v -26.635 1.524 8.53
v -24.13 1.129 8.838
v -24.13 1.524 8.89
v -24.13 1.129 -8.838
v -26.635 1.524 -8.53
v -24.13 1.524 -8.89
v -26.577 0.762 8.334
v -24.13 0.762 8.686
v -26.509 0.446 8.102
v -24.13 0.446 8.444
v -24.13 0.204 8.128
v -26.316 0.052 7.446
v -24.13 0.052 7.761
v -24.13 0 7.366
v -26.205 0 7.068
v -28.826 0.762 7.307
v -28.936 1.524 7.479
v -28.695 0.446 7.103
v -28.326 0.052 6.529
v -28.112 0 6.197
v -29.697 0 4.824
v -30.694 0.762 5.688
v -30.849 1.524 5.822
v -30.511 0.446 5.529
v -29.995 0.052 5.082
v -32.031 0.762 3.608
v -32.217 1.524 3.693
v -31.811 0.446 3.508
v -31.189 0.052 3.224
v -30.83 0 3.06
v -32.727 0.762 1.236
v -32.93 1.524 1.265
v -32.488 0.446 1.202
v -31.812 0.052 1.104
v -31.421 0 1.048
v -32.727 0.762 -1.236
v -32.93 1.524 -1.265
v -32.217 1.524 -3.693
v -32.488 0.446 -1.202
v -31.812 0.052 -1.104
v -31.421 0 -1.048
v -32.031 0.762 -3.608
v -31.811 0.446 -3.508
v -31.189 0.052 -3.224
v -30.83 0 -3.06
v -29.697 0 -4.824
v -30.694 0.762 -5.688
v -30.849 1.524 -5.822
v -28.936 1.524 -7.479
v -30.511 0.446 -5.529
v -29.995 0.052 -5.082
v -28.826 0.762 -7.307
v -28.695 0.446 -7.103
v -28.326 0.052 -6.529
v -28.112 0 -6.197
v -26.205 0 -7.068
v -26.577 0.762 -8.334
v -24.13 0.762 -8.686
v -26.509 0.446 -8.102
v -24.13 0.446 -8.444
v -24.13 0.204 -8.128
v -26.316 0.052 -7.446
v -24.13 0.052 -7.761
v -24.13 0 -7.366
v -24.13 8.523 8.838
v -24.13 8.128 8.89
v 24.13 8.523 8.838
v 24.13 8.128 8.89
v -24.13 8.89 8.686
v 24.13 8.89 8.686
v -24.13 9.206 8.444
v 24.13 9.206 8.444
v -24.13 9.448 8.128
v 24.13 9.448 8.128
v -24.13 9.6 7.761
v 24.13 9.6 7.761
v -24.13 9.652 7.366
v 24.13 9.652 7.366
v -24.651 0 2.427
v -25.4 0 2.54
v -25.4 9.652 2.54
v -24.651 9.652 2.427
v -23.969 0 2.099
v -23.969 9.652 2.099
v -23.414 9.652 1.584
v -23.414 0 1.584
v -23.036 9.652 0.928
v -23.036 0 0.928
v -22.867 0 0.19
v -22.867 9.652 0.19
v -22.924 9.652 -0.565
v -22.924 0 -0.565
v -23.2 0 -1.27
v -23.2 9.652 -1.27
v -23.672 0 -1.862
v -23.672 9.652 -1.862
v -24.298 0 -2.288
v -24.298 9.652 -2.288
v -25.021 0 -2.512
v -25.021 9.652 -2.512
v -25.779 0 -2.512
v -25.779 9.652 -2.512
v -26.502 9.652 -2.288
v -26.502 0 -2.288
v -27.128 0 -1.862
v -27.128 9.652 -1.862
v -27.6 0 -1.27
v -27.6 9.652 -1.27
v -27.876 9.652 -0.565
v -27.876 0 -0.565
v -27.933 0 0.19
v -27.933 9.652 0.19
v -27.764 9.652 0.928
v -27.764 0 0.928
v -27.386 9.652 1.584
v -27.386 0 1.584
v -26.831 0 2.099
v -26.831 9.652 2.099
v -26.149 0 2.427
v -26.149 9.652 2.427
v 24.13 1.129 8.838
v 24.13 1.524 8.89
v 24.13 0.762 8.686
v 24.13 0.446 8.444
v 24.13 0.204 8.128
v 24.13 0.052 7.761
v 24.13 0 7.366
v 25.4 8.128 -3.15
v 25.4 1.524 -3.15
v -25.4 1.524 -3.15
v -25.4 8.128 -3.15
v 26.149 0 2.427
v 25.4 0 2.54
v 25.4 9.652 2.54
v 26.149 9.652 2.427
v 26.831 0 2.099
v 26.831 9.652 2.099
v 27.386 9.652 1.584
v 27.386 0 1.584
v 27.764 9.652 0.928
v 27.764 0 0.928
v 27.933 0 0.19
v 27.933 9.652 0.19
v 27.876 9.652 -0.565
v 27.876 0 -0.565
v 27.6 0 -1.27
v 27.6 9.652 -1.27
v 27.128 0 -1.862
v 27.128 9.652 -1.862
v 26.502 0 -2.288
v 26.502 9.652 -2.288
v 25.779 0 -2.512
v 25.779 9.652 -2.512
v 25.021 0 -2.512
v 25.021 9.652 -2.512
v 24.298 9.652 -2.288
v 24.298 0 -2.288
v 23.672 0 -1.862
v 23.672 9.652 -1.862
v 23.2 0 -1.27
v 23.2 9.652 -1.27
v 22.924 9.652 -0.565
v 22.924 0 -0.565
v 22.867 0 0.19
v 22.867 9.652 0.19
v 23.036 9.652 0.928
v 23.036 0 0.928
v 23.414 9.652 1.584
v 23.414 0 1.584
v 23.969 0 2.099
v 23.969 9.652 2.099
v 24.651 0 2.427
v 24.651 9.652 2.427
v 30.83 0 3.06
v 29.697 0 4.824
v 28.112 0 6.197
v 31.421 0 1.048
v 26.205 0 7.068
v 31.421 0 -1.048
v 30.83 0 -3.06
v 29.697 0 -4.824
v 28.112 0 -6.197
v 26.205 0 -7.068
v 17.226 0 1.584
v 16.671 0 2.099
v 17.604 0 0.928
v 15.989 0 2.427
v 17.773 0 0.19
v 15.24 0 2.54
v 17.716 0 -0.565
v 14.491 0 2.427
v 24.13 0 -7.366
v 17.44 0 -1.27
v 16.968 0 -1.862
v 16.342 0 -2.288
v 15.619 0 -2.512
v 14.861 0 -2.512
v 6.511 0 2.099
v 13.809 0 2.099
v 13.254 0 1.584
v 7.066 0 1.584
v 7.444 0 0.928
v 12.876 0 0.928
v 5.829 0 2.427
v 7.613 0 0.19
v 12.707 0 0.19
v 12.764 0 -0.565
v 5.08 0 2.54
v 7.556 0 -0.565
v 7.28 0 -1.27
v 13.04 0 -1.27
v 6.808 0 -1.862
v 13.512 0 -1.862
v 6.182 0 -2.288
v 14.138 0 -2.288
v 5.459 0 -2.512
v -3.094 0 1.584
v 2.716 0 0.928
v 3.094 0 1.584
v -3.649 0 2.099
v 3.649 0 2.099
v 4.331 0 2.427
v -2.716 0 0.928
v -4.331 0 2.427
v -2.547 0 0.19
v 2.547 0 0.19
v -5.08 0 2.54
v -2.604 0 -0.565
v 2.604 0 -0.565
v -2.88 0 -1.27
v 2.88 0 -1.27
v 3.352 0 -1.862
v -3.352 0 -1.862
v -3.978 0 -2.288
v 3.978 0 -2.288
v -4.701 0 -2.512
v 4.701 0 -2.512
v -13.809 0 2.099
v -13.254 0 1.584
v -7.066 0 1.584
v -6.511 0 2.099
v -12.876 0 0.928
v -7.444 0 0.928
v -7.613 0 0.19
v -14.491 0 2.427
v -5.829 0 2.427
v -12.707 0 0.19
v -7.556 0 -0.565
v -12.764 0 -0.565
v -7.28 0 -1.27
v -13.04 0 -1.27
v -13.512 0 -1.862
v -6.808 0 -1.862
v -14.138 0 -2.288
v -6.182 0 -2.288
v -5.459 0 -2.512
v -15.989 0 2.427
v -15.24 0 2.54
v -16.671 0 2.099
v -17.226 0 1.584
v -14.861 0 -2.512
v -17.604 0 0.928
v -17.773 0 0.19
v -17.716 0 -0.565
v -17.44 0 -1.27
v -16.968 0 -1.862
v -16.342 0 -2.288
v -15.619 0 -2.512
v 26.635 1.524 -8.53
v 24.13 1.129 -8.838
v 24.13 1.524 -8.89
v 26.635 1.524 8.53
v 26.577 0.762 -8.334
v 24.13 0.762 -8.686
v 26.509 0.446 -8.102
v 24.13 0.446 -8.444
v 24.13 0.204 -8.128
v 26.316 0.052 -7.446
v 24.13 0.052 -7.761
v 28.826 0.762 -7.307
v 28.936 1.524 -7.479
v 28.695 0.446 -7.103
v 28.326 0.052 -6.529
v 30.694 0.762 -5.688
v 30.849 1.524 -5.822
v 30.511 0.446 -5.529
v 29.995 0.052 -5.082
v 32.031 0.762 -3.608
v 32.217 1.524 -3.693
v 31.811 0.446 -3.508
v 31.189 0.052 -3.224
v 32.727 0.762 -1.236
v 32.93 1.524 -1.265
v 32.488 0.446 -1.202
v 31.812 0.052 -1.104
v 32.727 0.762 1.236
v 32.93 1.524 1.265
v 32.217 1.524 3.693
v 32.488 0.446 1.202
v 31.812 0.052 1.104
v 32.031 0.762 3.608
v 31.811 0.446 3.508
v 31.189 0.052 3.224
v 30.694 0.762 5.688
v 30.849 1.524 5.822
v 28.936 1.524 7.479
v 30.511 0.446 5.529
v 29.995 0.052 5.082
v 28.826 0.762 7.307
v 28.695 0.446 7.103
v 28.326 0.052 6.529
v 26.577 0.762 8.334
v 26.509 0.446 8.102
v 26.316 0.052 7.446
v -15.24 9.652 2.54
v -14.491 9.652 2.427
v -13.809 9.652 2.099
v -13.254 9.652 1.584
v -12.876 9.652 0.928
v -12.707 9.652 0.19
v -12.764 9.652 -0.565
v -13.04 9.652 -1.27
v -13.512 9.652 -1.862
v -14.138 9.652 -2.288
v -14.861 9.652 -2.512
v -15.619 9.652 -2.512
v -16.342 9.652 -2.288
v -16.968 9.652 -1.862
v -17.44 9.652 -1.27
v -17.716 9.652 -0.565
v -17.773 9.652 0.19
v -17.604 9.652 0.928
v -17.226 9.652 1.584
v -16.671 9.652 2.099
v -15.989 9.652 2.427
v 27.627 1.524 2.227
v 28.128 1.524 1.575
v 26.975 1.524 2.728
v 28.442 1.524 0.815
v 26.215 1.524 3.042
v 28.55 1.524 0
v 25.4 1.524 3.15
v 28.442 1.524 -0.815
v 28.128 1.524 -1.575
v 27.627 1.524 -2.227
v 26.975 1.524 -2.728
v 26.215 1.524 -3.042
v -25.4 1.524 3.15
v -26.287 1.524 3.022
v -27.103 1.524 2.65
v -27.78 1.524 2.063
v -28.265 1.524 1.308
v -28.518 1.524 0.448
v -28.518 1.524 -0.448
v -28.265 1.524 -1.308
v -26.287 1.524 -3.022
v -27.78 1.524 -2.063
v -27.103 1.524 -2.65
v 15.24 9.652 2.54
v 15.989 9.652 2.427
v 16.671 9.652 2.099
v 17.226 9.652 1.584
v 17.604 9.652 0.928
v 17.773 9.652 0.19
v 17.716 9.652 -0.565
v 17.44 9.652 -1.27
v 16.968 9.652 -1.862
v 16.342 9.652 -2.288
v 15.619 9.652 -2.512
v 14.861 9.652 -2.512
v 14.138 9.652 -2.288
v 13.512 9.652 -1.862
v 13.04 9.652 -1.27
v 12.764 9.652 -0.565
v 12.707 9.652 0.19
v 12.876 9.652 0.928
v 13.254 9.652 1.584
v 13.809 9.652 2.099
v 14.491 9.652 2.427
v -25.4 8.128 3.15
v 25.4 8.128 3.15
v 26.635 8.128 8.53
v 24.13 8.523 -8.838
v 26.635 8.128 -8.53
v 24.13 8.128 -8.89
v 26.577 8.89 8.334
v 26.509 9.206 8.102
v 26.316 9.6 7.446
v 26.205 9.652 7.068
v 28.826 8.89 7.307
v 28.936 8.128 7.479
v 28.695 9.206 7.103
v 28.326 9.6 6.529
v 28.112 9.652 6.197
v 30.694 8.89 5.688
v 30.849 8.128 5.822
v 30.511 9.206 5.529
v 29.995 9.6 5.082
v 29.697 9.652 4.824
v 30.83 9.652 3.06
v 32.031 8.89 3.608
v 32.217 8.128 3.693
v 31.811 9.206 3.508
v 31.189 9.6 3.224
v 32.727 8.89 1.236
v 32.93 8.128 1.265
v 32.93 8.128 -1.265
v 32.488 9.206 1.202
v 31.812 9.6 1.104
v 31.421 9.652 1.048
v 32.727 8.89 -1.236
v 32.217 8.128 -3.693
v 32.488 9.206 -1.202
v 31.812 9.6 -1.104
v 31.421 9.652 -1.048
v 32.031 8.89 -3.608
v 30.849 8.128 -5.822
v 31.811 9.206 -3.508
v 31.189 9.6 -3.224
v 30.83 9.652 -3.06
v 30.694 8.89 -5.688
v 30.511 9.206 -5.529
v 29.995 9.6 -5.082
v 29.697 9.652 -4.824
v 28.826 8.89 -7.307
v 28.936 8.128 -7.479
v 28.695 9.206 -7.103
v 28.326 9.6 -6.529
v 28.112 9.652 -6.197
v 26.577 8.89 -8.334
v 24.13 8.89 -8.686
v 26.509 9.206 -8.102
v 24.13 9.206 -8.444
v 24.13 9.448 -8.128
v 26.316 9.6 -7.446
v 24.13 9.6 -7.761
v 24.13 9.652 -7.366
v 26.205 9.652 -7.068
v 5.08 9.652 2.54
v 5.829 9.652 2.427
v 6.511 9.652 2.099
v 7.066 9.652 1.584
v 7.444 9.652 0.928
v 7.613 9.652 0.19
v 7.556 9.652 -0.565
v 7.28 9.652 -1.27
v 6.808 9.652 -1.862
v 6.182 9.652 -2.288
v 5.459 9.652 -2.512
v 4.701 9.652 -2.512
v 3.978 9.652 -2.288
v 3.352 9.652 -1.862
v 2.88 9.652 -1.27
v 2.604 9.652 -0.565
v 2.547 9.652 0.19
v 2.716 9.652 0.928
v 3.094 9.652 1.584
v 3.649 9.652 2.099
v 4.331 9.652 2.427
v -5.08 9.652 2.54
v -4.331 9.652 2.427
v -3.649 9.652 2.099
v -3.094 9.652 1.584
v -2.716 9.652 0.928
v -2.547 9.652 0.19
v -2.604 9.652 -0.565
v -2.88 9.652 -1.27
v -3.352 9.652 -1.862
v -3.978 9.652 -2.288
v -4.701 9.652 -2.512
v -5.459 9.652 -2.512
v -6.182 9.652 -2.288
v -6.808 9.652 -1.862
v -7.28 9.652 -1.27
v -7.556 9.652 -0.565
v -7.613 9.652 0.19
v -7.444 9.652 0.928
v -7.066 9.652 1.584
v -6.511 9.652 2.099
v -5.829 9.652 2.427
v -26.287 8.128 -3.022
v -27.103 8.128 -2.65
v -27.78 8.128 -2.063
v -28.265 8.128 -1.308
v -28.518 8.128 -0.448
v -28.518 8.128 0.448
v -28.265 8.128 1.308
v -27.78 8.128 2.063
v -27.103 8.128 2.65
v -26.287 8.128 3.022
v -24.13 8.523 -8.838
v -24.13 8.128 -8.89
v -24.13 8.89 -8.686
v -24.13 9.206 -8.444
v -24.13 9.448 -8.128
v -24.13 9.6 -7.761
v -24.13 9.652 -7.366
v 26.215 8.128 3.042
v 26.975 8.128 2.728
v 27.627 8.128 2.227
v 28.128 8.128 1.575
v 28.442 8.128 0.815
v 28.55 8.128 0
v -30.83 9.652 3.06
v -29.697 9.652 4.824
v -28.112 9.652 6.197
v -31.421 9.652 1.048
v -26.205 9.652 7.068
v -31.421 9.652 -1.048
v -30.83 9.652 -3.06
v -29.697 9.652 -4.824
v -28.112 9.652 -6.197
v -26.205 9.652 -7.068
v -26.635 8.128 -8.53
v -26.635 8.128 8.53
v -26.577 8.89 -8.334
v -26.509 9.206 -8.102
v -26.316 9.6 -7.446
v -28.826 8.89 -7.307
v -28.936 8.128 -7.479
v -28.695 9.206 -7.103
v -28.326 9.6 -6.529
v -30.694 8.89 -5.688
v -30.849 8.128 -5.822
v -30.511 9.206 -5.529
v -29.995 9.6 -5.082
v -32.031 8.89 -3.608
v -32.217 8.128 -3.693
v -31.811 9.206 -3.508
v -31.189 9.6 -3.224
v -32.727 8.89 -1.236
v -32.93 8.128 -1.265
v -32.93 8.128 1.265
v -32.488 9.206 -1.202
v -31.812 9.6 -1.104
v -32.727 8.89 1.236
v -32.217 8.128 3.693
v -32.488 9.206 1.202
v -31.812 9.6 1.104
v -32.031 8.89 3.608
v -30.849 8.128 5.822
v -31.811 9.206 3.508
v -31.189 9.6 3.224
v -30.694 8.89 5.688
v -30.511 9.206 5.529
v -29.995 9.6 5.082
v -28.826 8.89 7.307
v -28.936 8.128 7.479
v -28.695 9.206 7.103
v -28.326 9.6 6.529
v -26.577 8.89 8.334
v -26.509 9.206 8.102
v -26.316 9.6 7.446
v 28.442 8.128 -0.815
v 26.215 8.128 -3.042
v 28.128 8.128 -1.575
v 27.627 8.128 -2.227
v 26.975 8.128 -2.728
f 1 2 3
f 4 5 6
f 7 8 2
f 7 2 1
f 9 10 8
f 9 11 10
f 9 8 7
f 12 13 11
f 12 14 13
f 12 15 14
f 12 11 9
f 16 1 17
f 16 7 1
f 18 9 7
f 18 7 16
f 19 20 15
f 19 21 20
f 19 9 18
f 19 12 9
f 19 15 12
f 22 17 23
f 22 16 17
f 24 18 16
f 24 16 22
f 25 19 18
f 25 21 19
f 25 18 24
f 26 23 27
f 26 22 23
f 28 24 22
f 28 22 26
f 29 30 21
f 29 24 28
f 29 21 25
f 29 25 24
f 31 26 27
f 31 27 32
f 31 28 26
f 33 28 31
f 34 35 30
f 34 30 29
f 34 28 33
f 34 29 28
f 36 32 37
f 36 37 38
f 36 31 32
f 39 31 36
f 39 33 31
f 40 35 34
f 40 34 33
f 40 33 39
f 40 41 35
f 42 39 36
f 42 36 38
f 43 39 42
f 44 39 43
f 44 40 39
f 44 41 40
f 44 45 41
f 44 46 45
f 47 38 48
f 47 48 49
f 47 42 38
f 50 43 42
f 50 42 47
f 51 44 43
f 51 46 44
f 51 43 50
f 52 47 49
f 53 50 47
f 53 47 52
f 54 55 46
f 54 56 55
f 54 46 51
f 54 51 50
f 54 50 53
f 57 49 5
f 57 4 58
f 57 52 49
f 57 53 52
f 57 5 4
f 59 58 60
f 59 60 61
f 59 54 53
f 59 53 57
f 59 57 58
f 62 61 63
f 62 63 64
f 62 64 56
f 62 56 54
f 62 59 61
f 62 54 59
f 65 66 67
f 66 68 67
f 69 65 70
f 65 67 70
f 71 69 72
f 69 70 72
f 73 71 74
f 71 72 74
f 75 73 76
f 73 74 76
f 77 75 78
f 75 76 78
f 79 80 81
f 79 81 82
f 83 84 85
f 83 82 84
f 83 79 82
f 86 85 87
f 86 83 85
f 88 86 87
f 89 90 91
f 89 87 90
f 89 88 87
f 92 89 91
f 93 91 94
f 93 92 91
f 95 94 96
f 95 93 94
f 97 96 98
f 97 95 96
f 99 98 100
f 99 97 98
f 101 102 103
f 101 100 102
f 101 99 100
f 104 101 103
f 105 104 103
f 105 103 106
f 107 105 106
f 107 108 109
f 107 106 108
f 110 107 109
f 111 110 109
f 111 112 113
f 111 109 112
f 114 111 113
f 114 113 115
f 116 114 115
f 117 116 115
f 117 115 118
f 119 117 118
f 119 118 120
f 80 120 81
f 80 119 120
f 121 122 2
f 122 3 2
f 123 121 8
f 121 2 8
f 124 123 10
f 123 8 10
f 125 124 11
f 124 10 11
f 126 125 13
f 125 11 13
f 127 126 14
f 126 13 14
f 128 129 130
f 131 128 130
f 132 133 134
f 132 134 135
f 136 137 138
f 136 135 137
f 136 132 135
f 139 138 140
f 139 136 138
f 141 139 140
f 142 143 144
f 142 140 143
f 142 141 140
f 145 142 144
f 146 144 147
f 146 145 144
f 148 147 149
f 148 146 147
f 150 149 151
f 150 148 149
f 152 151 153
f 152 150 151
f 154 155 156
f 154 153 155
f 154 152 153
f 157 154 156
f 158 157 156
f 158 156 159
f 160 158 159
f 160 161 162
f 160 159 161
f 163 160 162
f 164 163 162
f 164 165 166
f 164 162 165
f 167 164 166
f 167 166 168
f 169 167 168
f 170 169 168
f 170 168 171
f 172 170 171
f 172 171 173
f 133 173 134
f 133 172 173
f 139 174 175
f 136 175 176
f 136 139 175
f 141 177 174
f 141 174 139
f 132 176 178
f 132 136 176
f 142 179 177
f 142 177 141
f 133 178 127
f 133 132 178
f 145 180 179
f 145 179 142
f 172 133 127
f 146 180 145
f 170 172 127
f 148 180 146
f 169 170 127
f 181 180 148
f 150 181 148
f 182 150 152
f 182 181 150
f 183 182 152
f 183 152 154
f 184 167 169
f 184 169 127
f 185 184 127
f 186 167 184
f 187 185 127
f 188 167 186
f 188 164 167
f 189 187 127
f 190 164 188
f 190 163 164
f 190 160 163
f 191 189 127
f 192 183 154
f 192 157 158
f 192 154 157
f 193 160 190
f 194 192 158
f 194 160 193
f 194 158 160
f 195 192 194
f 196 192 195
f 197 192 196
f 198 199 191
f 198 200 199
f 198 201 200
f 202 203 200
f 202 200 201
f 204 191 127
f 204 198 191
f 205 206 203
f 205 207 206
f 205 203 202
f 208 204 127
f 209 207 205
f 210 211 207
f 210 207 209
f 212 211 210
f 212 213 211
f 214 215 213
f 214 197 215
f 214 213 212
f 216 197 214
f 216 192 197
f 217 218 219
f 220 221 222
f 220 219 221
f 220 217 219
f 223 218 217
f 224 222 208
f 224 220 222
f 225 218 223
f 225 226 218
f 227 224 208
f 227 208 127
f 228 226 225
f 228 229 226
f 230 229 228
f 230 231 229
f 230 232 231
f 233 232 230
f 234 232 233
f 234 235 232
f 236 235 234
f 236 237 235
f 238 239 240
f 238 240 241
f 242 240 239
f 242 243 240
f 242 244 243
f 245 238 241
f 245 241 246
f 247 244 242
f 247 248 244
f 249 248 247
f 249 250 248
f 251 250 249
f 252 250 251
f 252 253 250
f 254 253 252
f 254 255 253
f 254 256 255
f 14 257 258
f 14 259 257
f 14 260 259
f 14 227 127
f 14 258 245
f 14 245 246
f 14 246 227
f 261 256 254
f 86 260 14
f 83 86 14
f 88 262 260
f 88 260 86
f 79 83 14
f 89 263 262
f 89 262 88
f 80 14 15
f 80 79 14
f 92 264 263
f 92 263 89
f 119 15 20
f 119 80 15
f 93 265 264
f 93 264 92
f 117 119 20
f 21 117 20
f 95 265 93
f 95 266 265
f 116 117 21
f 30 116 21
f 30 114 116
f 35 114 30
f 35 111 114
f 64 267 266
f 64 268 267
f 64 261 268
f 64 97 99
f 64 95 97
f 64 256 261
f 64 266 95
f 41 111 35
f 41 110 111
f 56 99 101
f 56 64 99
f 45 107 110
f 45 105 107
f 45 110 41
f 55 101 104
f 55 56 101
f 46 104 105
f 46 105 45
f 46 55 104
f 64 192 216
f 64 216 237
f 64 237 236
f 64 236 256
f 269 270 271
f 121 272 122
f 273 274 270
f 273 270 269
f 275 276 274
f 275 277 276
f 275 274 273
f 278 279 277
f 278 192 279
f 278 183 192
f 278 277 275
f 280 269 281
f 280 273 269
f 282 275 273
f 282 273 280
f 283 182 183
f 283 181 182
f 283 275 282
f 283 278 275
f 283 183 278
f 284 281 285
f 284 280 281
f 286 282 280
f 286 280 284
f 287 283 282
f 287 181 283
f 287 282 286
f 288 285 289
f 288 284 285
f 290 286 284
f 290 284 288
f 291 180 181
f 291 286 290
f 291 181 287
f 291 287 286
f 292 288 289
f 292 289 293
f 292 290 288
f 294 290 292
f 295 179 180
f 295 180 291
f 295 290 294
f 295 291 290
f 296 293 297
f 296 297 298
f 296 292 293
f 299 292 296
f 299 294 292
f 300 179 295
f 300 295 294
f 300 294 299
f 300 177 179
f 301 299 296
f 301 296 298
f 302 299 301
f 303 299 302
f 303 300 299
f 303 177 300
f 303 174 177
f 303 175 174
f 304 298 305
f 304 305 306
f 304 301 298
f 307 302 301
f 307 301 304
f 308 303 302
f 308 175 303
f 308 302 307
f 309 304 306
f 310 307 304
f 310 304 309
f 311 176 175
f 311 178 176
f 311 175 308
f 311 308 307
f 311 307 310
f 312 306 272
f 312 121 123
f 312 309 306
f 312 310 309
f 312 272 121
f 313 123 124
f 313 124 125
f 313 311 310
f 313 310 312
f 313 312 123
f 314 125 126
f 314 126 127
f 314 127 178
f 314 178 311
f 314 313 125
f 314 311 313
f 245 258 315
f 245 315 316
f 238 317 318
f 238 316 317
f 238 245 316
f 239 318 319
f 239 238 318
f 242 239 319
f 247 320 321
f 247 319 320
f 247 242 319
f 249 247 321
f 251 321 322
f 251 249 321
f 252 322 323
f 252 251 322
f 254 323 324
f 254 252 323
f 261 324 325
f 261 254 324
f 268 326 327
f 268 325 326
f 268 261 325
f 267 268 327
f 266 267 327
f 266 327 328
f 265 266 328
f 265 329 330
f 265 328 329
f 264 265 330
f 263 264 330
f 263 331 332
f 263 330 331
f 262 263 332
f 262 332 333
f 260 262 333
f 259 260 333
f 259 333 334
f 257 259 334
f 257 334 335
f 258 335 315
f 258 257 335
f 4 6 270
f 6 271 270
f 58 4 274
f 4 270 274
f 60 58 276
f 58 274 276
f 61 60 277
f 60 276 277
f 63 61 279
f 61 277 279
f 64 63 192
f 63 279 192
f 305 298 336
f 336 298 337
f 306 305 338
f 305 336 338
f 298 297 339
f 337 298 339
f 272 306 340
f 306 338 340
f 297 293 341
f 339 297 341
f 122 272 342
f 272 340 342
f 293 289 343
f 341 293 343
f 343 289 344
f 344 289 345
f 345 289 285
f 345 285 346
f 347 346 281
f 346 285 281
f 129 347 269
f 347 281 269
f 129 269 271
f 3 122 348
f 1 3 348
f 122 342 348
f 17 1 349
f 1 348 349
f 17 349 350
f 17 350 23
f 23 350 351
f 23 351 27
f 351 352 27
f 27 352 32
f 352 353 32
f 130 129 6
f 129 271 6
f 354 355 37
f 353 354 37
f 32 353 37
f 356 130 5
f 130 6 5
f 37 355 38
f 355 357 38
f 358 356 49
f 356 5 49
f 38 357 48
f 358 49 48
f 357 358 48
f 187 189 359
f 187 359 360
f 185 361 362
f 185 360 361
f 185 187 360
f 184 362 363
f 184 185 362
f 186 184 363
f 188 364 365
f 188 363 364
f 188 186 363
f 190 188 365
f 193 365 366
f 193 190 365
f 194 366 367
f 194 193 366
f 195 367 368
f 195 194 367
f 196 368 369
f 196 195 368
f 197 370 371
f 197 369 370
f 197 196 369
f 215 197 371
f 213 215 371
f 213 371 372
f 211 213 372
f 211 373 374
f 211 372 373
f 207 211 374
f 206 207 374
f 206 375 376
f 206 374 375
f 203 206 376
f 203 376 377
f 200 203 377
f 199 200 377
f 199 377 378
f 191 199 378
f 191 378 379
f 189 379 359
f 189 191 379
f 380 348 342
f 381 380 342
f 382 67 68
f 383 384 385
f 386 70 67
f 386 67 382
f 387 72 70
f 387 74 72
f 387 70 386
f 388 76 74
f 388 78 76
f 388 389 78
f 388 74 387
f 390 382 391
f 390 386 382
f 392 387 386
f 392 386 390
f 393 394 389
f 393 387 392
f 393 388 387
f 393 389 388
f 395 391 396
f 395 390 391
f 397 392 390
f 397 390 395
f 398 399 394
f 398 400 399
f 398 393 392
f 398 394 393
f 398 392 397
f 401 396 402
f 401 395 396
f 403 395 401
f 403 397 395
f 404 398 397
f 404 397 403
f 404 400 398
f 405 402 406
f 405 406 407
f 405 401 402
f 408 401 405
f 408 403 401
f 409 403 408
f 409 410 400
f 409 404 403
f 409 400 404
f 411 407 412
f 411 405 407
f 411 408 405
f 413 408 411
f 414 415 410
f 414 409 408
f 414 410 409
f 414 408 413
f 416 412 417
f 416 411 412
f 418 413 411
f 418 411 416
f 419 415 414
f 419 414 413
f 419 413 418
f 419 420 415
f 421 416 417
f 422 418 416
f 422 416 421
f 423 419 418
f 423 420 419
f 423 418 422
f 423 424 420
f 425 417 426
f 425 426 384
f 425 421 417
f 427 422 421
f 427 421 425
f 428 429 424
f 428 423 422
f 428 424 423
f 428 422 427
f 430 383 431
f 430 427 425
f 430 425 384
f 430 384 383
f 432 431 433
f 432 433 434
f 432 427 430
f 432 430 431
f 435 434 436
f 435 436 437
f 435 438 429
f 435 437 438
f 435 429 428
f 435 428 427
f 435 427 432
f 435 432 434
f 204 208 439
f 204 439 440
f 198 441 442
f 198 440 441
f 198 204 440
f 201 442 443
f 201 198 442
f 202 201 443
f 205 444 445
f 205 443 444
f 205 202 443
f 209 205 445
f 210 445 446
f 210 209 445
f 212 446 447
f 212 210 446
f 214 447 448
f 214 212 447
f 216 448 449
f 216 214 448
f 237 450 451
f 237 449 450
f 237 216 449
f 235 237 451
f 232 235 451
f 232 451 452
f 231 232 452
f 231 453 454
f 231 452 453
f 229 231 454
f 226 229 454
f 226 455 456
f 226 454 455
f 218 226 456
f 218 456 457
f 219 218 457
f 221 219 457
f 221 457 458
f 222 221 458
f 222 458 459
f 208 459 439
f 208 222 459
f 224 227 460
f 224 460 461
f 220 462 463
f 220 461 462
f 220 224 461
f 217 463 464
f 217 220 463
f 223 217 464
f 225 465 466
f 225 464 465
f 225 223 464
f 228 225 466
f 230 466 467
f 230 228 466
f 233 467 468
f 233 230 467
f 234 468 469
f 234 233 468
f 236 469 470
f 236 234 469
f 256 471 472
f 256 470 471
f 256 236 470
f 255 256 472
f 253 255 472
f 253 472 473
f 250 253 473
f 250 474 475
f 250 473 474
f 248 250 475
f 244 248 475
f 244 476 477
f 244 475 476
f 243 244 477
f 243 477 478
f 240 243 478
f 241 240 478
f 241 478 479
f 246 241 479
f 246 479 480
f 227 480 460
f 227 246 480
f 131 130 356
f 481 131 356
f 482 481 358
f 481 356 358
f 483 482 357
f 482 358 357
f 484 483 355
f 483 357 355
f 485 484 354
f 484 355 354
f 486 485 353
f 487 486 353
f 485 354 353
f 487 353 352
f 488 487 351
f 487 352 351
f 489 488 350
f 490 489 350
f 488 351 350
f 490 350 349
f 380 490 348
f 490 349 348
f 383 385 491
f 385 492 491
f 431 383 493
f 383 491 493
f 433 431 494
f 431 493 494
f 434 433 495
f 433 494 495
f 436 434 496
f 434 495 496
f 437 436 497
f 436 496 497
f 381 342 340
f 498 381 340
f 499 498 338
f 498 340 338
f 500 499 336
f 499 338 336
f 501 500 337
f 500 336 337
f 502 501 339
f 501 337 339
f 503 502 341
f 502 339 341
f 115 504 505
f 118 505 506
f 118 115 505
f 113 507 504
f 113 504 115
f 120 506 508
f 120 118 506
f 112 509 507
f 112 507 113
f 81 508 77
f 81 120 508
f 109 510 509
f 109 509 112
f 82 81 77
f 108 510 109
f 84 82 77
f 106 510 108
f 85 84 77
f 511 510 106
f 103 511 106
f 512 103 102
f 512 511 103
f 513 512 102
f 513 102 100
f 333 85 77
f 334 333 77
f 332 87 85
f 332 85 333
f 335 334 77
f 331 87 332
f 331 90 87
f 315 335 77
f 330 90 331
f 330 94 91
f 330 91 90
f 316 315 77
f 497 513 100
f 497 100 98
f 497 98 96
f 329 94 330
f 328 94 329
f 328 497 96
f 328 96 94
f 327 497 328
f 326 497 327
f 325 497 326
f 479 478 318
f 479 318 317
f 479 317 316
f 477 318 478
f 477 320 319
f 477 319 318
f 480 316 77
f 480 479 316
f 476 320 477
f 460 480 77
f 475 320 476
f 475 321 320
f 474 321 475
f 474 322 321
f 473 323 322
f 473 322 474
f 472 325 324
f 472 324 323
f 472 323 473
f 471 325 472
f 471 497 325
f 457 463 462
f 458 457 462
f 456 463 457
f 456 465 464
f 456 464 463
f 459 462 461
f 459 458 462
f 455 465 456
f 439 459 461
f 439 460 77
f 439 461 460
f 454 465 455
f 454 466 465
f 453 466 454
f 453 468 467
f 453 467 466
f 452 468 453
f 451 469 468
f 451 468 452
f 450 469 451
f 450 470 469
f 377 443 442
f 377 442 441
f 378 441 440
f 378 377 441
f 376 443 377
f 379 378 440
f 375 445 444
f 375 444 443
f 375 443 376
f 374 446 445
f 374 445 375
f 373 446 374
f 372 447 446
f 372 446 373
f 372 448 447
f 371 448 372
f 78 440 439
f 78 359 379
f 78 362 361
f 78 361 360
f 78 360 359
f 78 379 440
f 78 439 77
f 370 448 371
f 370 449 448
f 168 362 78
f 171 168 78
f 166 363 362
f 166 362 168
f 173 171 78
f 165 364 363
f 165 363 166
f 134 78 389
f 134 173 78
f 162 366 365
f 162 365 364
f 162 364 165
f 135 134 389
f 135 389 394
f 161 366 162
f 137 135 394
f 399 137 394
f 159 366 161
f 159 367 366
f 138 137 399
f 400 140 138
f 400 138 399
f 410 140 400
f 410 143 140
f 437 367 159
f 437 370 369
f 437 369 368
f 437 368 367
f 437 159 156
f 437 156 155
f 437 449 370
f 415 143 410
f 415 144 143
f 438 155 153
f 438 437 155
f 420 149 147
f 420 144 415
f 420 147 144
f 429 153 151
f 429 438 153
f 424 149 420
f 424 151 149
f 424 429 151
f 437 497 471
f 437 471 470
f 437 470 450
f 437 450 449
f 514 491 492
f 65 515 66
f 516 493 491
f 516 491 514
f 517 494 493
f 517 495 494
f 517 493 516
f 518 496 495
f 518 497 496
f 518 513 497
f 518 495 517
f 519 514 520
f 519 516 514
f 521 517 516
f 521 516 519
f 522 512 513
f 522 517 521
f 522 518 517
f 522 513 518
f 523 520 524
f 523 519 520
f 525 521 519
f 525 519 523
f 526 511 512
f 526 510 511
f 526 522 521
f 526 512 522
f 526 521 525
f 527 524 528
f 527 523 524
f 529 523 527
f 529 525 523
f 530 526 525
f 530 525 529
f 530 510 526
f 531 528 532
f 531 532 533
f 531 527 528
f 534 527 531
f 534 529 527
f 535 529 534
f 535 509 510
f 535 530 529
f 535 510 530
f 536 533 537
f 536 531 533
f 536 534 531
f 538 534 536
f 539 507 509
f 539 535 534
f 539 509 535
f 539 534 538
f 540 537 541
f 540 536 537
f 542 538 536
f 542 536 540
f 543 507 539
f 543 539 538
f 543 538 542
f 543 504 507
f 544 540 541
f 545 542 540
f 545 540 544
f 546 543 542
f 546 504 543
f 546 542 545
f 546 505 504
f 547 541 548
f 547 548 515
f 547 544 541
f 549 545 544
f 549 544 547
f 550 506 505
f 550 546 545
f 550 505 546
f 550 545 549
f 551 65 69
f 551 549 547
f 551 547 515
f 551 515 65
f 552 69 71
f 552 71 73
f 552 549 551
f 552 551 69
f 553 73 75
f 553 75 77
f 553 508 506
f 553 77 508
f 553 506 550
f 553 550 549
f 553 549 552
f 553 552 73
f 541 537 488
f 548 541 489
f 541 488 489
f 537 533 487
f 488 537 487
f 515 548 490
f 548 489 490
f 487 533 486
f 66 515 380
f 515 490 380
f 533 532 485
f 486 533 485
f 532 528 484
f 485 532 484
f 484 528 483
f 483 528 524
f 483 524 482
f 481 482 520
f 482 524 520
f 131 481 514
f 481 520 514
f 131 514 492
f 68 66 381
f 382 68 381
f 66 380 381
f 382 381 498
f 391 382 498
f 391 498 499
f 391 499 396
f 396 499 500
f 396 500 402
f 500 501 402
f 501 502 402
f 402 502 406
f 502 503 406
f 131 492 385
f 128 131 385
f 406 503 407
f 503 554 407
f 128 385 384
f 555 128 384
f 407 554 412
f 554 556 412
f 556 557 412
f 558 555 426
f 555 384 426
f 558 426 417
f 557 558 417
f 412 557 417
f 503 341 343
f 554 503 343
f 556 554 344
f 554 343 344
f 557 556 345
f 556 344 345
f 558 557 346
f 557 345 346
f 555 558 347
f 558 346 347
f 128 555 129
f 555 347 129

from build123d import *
from build123d.topology import SkipClean

# Parameters (mm, degrees)
BOSS_EXTRUDE1_DEPTH     = 1.524
SKETCH2_R               = 1.27
BOSS_EXTRUDE2_DEPTH     = 6.604
BOSS_EXTRUDE3_DEPTH     = 1.524
FILLET1_R               = 1.524
CUT_EXTRUDE1_DEPTH      = 36.148497607
CUT_EXTRUDE1_DEPTH_BACK = 36.148497607
SKETCH2_3_R             = 1.27
CUT_EXTRUDE2_DEPTH      = 36.531867443
CUT_EXTRUDE2_DEPTH_BACK = 36.531867443
SKETCH4_R               = 2.54


with BuildPart() as part:
    # Sketch1 → Boss-Extrude1 (new body)
    with BuildSketch(Plane(origin=(0, 0, 0), x_dir=(1, 0, 0), z_dir=(0, 1, 0))):
        with BuildLine():
            Line((24.13, -8.89), (-24.13, -8.89))
            ThreePointArc((-24.13, -8.89), (-33.02, 0), (-24.13, 8.89))
            Line((-24.13, 8.89), (24.13, 8.89))
            ThreePointArc((24.13, 8.89), (33.02, 0), (24.13, -8.89))
        make_face()
    extrude(amount=BOSS_EXTRUDE1_DEPTH)

    # Sketch2 → Boss-Extrude2 (add)
    # profile 1 of 35: a face of its own
    with BuildSketch(Plane(origin=(0, 1.524, 0), x_dir=(1, 0, 0), z_dir=(0, 1, 0))):
        with BuildLine():
            ThreePointArc((-22.643661095, 1.524), (-23.8000016, 2.71292928), (-25.4, 3.1496))
            ThreePointArc((-25.4, 3.1496), (-28.5496, 0), (-25.4, -3.1496))
            ThreePointArc((-25.4, -3.1496), (-23.8000016, -2.71292928), (-22.643661095, -1.524))
            Line((-22.643661095, -1.524), (-25.4, -1.524))
            Line((-25.4, -1.524), (-25.4, -1.27))
            ThreePointArc((-25.4, -1.27), (-26.67, 0), (-25.4, 1.27))
            Line((-25.4, 1.27), (-25.4, 1.524))
            Line((-25.4, 1.524), (-22.643661095, 1.524))
        make_face()
    # profile 2 of 35: a face of its own
    with BuildSketch(Plane(origin=(0, 1.524, 0), x_dir=(1, 0, 0), z_dir=(0, 1, 0))):
        with BuildLine():
            ThreePointArc((-22.2504, 0), (-22.35029959, 0.786960972), (-22.643661095, 1.524))
            Line((-22.643661095, 1.524), (-25.4, 1.524))
            Line((-25.4, 1.524), (-25.4, 1.27))
            ThreePointArc((-25.4, 1.27), (-24.501974388, 0.898025612), (-24.13, 0))
            ThreePointArc((-24.13, 0), (-24.501974388, -0.898025612), (-25.4, -1.27))
            Line((-25.4, -1.27), (-25.4, -1.524))
            Line((-25.4, -1.524), (-22.643661095, -1.524))
            ThreePointArc((-22.643661095, -1.524), (-22.35029959, -0.786960972), (-22.2504, 0))
        make_face()
    # profile 3 of 35: a face of its own
    with BuildSketch(Plane(origin=(0, 1.524, 0), x_dir=(1, 0, 0), z_dir=(0, 1, 0))):
        with BuildLine():
            Line((-15.24, 3.1496), (-25.4, 3.1496))
            ThreePointArc((-25.4, 3.1496), (-23.8000016, 2.71292928), (-22.643661095, 1.524))
            Line((-22.643661095, 1.524), (-17.996338905, 1.524))
            ThreePointArc((-17.996338905, 1.524), (-16.8399984, 2.71292928), (-15.24, 3.1496))
        make_face()
    # profile 4 of 35: a face of its own
    with BuildSketch(Plane(origin=(0, 1.524, 0), x_dir=(1, 0, 0), z_dir=(0, 1, 0))):
        with BuildLine():
            Line((-17.996338905, 1.524), (-22.643661095, 1.524))
            ThreePointArc((-22.643661095, 1.524), (-22.35029959, 0.786960972), (-22.2504, 0))
            ThreePointArc((-22.2504, 0), (-22.35029959, -0.786960972), (-22.643661095, -1.524))
            Line((-22.643661095, -1.524), (-17.996338905, -1.524))
            ThreePointArc((-17.996338905, -1.524), (-18.3896, 0), (-17.996338905, 1.524))
        make_face()
    # profile 5 of 35: a face of its own
    with BuildSketch(Plane(origin=(0, 1.524, 0), x_dir=(1, 0, 0), z_dir=(0, 1, 0))):
        with BuildLine():
            ThreePointArc((-22.643661095, 1.524), (-23.8000016, 2.71292928), (-25.4, 3.1496))
            ThreePointArc((-25.4, 3.1496), (-28.5496, 0), (-25.4, -3.1496))
            ThreePointArc((-25.4, -3.1496), (-23.8000016, -2.71292928), (-22.643661095, -1.524))
            Line((-22.643661095, -1.524), (-25.4, -1.524))
            Line((-25.4, -1.524), (-25.4, -1.27))
            ThreePointArc((-25.4, -1.27), (-26.67, 0), (-25.4, 1.27))
            Line((-25.4, 1.27), (-25.4, 1.524))
            Line((-25.4, 1.524), (-22.643661095, 1.524))
        make_face()
    # profile 6 of 35: a face of its own
    with BuildSketch(Plane(origin=(0, 1.524, 0), x_dir=(1, 0, 0), z_dir=(0, 1, 0))):
        with BuildLine():
            ThreePointArc((-22.2504, 0), (-22.35029959, 0.786960972), (-22.643661095, 1.524))
            Line((-22.643661095, 1.524), (-25.4, 1.524))
            Line((-25.4, 1.524), (-25.4, 1.27))
            ThreePointArc((-25.4, 1.27), (-24.501974388, 0.898025612), (-24.13, 0))
            ThreePointArc((-24.13, 0), (-24.501974388, -0.898025612), (-25.4, -1.27))
            Line((-25.4, -1.27), (-25.4, -1.524))
            Line((-25.4, -1.524), (-22.643661095, -1.524))
            ThreePointArc((-22.643661095, -1.524), (-22.35029959, -0.786960972), (-22.2504, 0))
        make_face()
    # profile 7 of 35: a face of its own
    with BuildSketch(Plane(origin=(0, 1.524, 0), x_dir=(1, 0, 0), z_dir=(0, 1, 0))):
        with BuildLine():
            ThreePointArc((-22.643661095, -1.524), (-23.8000016, -2.71292928), (-25.4, -3.1496))
            Line((-25.4, -3.1496), (-15.24, -3.1496))
            ThreePointArc((-15.24, -3.1496), (-16.8399984, -2.71292928), (-17.996338905, -1.524))
            Line((-17.996338905, -1.524), (-22.643661095, -1.524))
        make_face()
    # profile 8 of 35: a face of its own
    with BuildSketch(Plane(origin=(0, 1.524, 0), x_dir=(1, 0, 0), z_dir=(0, 1, 0))):
        with BuildLine():
            ThreePointArc((-17.996338905, -1.524), (-16.8399984, -2.71292928), (-15.24, -3.1496))
            ThreePointArc((-15.24, -3.1496), (-13.6400016, -2.71292928), (-12.483661095, -1.524))
            Line((-12.483661095, -1.524), (-17.996338905, -1.524))
        make_face()
    # profile 9 of 35: a face of its own
    with BuildSketch(Plane(origin=(0, 1.524, 0), x_dir=(1, 0, 0), z_dir=(0, 1, 0))):
        with BuildLine():
            ThreePointArc((-12.0904, 0), (-12.19029959, 0.786960972), (-12.483661095, 1.524))
            Line((-12.483661095, 1.524), (-17.996338905, 1.524))
            ThreePointArc((-17.996338905, 1.524), (-18.3896, 0), (-17.996338905, -1.524))
            Line((-17.996338905, -1.524), (-12.483661095, -1.524))
            ThreePointArc((-12.483661095, -1.524), (-12.19029959, -0.786960972), (-12.0904, 0))
        make_face()
        with Locations(Location((-15.24, 0, 0), (0, 0, 90))):
            Circle(SKETCH2_R, mode=Mode.SUBTRACT)
    # profile 10 of 35: a face of its own
    with BuildSketch(Plane(origin=(0, 1.524, 0), x_dir=(1, 0, 0), z_dir=(0, 1, 0))):
        with BuildLine():
            ThreePointArc((-12.483661095, 1.524), (-13.6400016, 2.71292928), (-15.24, 3.1496))
            ThreePointArc((-15.24, 3.1496), (-16.8399984, 2.71292928), (-17.996338905, 1.524))
            Line((-17.996338905, 1.524), (-12.483661095, 1.524))
        make_face()
    # profile 11 of 35: a face of its own
    with BuildSketch(Plane(origin=(0, 1.524, 0), x_dir=(1, 0, 0), z_dir=(0, 1, 0))):
        with BuildLine():
            Line((-5.080000024, 3.1496), (-15.24, 3.1496))
            ThreePointArc((-15.24, 3.1496), (-13.6400016, 2.71292928), (-12.483661095, 1.524))
            Line((-12.483661095, 1.524), (-7.836338905, 1.524))
            ThreePointArc((-7.836338905, 1.524), (-6.67999841, 2.712929274), (-5.080000024, 3.1496))
        make_face()
    # profile 12 of 35: a face of its own
    with BuildSketch(Plane(origin=(0, 1.524, 0), x_dir=(1, 0, 0), z_dir=(0, 1, 0))):
        with BuildLine():
            Line((-7.836338905, 1.524), (-12.483661095, 1.524))
            ThreePointArc((-12.483661095, 1.524), (-12.19029959, 0.786960972), (-12.0904, 0))
            ThreePointArc((-12.0904, 0), (-12.19029959, -0.786960972), (-12.483661095, -1.524))
            Line((-12.483661095, -1.524), (-7.836338905, -1.524))
            ThreePointArc((-7.836338905, -1.524), (-8.2296, 0), (-7.836338905, 1.524))
        make_face()
    # profile 13 of 35: a face of its own
    with BuildSketch(Plane(origin=(0, 1.524, 0), x_dir=(1, 0, 0), z_dir=(0, 1, 0))):
        with BuildLine():
            ThreePointArc((-12.483661095, -1.524), (-13.6400016, -2.71292928), (-15.24, -3.1496))
            Line((-15.24, -3.1496), (-5.080000009, -3.1496))
            ThreePointArc((-5.080000009, -3.1496), (-6.679998404, -2.712929278), (-7.836338905, -1.524))
            Line((-7.836338905, -1.524), (-12.483661095, -1.524))
        make_face()
    # profile 14 of 35: a face of its own
    with BuildSketch(Plane(origin=(0, 1.524, 0), x_dir=(1, 0, 0), z_dir=(0, 1, 0))):
        with BuildLine():
            ThreePointArc((-7.836338905, -1.524), (-6.679998404, -2.712929278), (-5.080000009, -3.1496))
            ThreePointArc((-5.080000009, -3.1496), (-3.480001604, -2.712929283), (-2.323661095, -1.524))
            Line((-2.323661095, -1.524), (-7.836338905, -1.524))
        make_face()
    # profile 15 of 35: a face of its own
    with BuildSketch(Plane(origin=(0, 1.524, 0), x_dir=(1, 0, 0), z_dir=(0, 1, 0))):
        with BuildLine():
            ThreePointArc((-1.9304, 0), (-2.03029959, 0.786960972), (-2.323661095, 1.524))
            Line((-2.323661095, 1.524), (-7.836338905, 1.524))
            ThreePointArc((-7.836338905, 1.524), (-8.2296, 0), (-7.836338905, -1.524))
            Line((-7.836338905, -1.524), (-2.323661095, -1.524))
            ThreePointArc((-2.323661095, -1.524), (-2.03029959, -0.786960972), (-1.9304, 0))
        make_face()
        with Locations(Location((-5.08, 0, 0), (0, 0, 90))):
            Circle(SKETCH2_R, mode=Mode.SUBTRACT)
    # profile 16 of 35: a face of its own
    with BuildSketch(Plane(origin=(0, 1.524, 0), x_dir=(1, 0, 0), z_dir=(0, 1, 0))):
        with BuildLine():
            ThreePointArc((-2.323661095, 1.524), (-3.48000161, 2.712929286), (-5.080000024, 3.1496))
            ThreePointArc((-5.080000024, 3.1496), (-6.67999841, 2.712929274), (-7.836338905, 1.524))
            Line((-7.836338905, 1.524), (-2.323661095, 1.524))
        make_face()
    # profile 17 of 35: a face of its own
    with BuildSketch(Plane(origin=(0, 1.524, 0), x_dir=(1, 0, 0), z_dir=(0, 1, 0))):
        with BuildLine():
            Line((5.079999991, 3.1496), (-5.080000024, 3.1496))
            ThreePointArc((-5.080000024, 3.1496), (-3.48000161, 2.712929286), (-2.323661095, 1.524))
            Line((-2.323661095, 1.524), (2.323661095, 1.524))
            ThreePointArc((2.323661095, 1.524), (3.480001596, 2.712929278), (5.079999991, 3.1496))
        make_face()
    # profile 18 of 35: a face of its own
    with BuildSketch(Plane(origin=(0, 1.524, 0), x_dir=(1, 0, 0), z_dir=(0, 1, 0))):
        with BuildLine():
            Line((2.323661095, 1.524), (-2.323661095, 1.524))
            ThreePointArc((-2.323661095, 1.524), (-2.03029959, 0.786960972), (-1.9304, 0))
            ThreePointArc((-1.9304, 0), (-2.03029959, -0.786960972), (-2.323661095, -1.524))
            Line((-2.323661095, -1.524), (2.323661095, -1.524))
            ThreePointArc((2.323661095, -1.524), (1.9304, 0), (2.323661095, 1.524))
        make_face()
    # profile 19 of 35: a face of its own
    with BuildSketch(Plane(origin=(0, 1.524, 0), x_dir=(1, 0, 0), z_dir=(0, 1, 0))):
        with BuildLine():
            ThreePointArc((-2.323661095, -1.524), (-3.480001604, -2.712929283), (-5.080000009, -3.1496))
            Line((-5.080000009, -3.1496), (5.079999981, -3.1496))
            ThreePointArc((5.079999981, -3.1496), (3.480001592, -2.712929275), (2.323661095, -1.524))
            Line((2.323661095, -1.524), (-2.323661095, -1.524))
        make_face()
    # profile 20 of 35: a face of its own
    with BuildSketch(Plane(origin=(0, 1.524, 0), x_dir=(1, 0, 0), z_dir=(0, 1, 0))):
        with BuildLine():
            ThreePointArc((2.323661095, -1.524), (3.480001592, -2.712929275), (5.079999981, -3.1496))
            ThreePointArc((5.079999981, -3.1496), (6.679998392, -2.712929285), (7.836338905, -1.524))
            Line((7.836338905, -1.524), (2.323661095, -1.524))
        make_face()
    # profile 21 of 35: a face of its own
    with BuildSketch(Plane(origin=(0, 1.524, 0), x_dir=(1, 0, 0), z_dir=(0, 1, 0))):
        with BuildLine():
            ThreePointArc((8.2296, 0), (8.12970041, 0.786960972), (7.836338905, 1.524))
            Line((7.836338905, 1.524), (2.323661095, 1.524))
            ThreePointArc((2.323661095, 1.524), (1.9304, 0), (2.323661095, -1.524))
            Line((2.323661095, -1.524), (7.836338905, -1.524))
            ThreePointArc((7.836338905, -1.524), (8.12970041, -0.786960972), (8.2296, 0))
        make_face()
        with Locations(Location((5.08, 0, 0), (0, 0, 90))):
            Circle(SKETCH2_R, mode=Mode.SUBTRACT)
    # profile 22 of 35: a face of its own
    with BuildSketch(Plane(origin=(0, 1.524, 0), x_dir=(1, 0, 0), z_dir=(0, 1, 0))):
        with BuildLine():
            ThreePointArc((7.836338905, 1.524), (6.679998396, 2.712929283), (5.079999991, 3.1496))
            ThreePointArc((5.079999991, 3.1496), (3.480001596, 2.712929278), (2.323661095, 1.524))
            Line((2.323661095, 1.524), (7.836338905, 1.524))
        make_face()
    # profile 23 of 35: a face of its own
    with BuildSketch(Plane(origin=(0, 1.524, 0), x_dir=(1, 0, 0), z_dir=(0, 1, 0))):
        with BuildLine():
            Line((15.240000007, 3.1496), (5.079999991, 3.1496))
            ThreePointArc((5.079999991, 3.1496), (6.679998396, 2.712929283), (7.836338905, 1.524))
            Line((7.836338905, 1.524), (12.483661095, 1.524))
            ThreePointArc((12.483661095, 1.524), (13.640001603, 2.712929282), (15.240000007, 3.1496))
        make_face()
    # profile 24 of 35: a face of its own
    with BuildSketch(Plane(origin=(0, 1.524, 0), x_dir=(1, 0, 0), z_dir=(0, 1, 0))):
        with BuildLine():
            Line((12.483661095, 1.524), (7.836338905, 1.524))
            ThreePointArc((7.836338905, 1.524), (8.12970041, 0.786960972), (8.2296, 0))
            ThreePointArc((8.2296, 0), (8.12970041, -0.786960972), (7.836338905, -1.524))
            Line((7.836338905, -1.524), (12.483661095, -1.524))
            ThreePointArc((12.483661095, -1.524), (12.0904, 0), (12.483661095, 1.524))
        make_face()
    # profile 25 of 35: a face of its own
    with BuildSketch(Plane(origin=(0, 1.524, 0), x_dir=(1, 0, 0), z_dir=(0, 1, 0))):
        with BuildLine():
            ThreePointArc((7.836338905, -1.524), (6.679998392, -2.712929285), (5.079999981, -3.1496))
            Line((5.079999981, -3.1496), (15.24, -3.1496))
            ThreePointArc((15.24, -3.1496), (13.6400016, -2.71292928), (12.483661095, -1.524))
            Line((12.483661095, -1.524), (7.836338905, -1.524))
        make_face()
    # profile 26 of 35: a face of its own
    with BuildSketch(Plane(origin=(0, 1.524, 0), x_dir=(1, 0, 0), z_dir=(0, 1, 0))):
        with BuildLine():
            ThreePointArc((12.483661095, -1.524), (13.6400016, -2.71292928), (15.24, -3.1496))
            ThreePointArc((15.24, -3.1496), (16.8399984, -2.71292928), (17.996338905, -1.524))
            Line((17.996338905, -1.524), (12.483661095, -1.524))
        make_face()
    # profile 27 of 35: a face of its own
    with BuildSketch(Plane(origin=(0, 1.524, 0), x_dir=(1, 0, 0), z_dir=(0, 1, 0))):
        with BuildLine():
            ThreePointArc((18.3896, 0), (18.28970041, 0.786960972), (17.996338905, 1.524))
            Line((17.996338905, 1.524), (12.483661095, 1.524))
            ThreePointArc((12.483661095, 1.524), (12.0904, 0), (12.483661095, -1.524))
            Line((12.483661095, -1.524), (17.996338905, -1.524))
            ThreePointArc((17.996338905, -1.524), (18.28970041, -0.786960972), (18.3896, 0))
        make_face()
        with Locations(Location((15.24, 0, 0), (0, 0, 90))):
            Circle(SKETCH2_R, mode=Mode.SUBTRACT)
    # profile 28 of 35: a face of its own
    with BuildSketch(Plane(origin=(0, 1.524, 0), x_dir=(1, 0, 0), z_dir=(0, 1, 0))):
        with BuildLine():
            ThreePointArc((17.996338905, 1.524), (16.839998403, 2.712929279), (15.240000007, 3.1496))
            ThreePointArc((15.240000007, 3.1496), (13.640001603, 2.712929282), (12.483661095, 1.524))
            Line((12.483661095, 1.524), (17.996338905, 1.524))
        make_face()
    # profile 29 of 35: a face of its own
    with BuildSketch(Plane(origin=(0, 1.524, 0), x_dir=(1, 0, 0), z_dir=(0, 1, 0))):
        with BuildLine():
            Line((25.4, 3.1496), (15.240000007, 3.1496))
            ThreePointArc((15.240000007, 3.1496), (16.839998403, 2.712929279), (17.996338905, 1.524))
            Line((17.996338905, 1.524), (22.643661095, 1.524))
            ThreePointArc((22.643661095, 1.524), (23.8000016, 2.71292928), (25.4, 3.1496))
        make_face()
    # profile 30 of 35: a face of its own
    with BuildSketch(Plane(origin=(0, 1.524, 0), x_dir=(1, 0, 0), z_dir=(0, 1, 0))):
        with BuildLine():
            ThreePointArc((17.996338905, -1.524), (16.8399984, -2.71292928), (15.24, -3.1496))
            Line((15.24, -3.1496), (25.4, -3.1496))
            ThreePointArc((25.4, -3.1496), (23.8000016, -2.71292928), (22.643661095, -1.524))
            Line((22.643661095, -1.524), (17.996338905, -1.524))
        make_face()
    # profile 31 of 35: a face of its own
    with BuildSketch(Plane(origin=(0, 1.524, 0), x_dir=(1, 0, 0), z_dir=(0, 1, 0))):
        with BuildLine():
            Line((22.643661095, 1.524), (17.996338905, 1.524))
            ThreePointArc((17.996338905, 1.524), (18.28970041, 0.786960972), (18.3896, 0))
            ThreePointArc((18.3896, 0), (18.28970041, -0.786960972), (17.996338905, -1.524))
            Line((17.996338905, -1.524), (22.643661095, -1.524))
            ThreePointArc((22.643661095, -1.524), (22.2504, 0), (22.643661095, 1.524))
        make_face()
    # profile 32 of 35: a face of its own
    with BuildSketch(Plane(origin=(0, 1.524, 0), x_dir=(1, 0, 0), z_dir=(0, 1, 0))):
        with BuildLine():
            ThreePointArc((28.5496, 0), (27.627103518, 2.227103518), (25.4, 3.1496))
            ThreePointArc((25.4, 3.1496), (23.8000016, 2.71292928), (22.643661095, 1.524))
            Line((22.643661095, 1.524), (25.4, 1.524))
            Line((25.4, 1.524), (25.4, 1.27))
            ThreePointArc((25.4, 1.27), (26.298025612, 0.898025612), (26.67, 0))
            ThreePointArc((26.67, 0), (26.298025612, -0.898025612), (25.4, -1.27))
            Line((25.4, -1.27), (25.4, -1.524))
            Line((25.4, -1.524), (22.643661095, -1.524))
            ThreePointArc((22.643661095, -1.524), (23.8000016, -2.71292928), (25.4, -3.1496))
            ThreePointArc((25.4, -3.1496), (27.627103518, -2.227103518), (28.5496, 0))
        make_face()
    # profile 33 of 35: a face of its own
    with BuildSketch(Plane(origin=(0, 1.524, 0), x_dir=(1, 0, 0), z_dir=(0, 1, 0))):
        with BuildLine():
            Line((25.4, 1.524), (22.643661095, 1.524))
            ThreePointArc((22.643661095, 1.524), (22.2504, 0), (22.643661095, -1.524))
            Line((22.643661095, -1.524), (25.4, -1.524))
            Line((25.4, -1.524), (25.4, -1.27))
            ThreePointArc((25.4, -1.27), (24.13, 0), (25.4, 1.27))
            Line((25.4, 1.27), (25.4, 1.524))
        make_face()
    # profile 34 of 35: a face of its own
    with BuildSketch(Plane(origin=(0, 1.524, 0), x_dir=(1, 0, 0), z_dir=(0, 1, 0))):
        with BuildLine():
            ThreePointArc((28.5496, 0), (27.627103518, 2.227103518), (25.4, 3.1496))
            ThreePointArc((25.4, 3.1496), (23.8000016, 2.71292928), (22.643661095, 1.524))
            Line((22.643661095, 1.524), (25.4, 1.524))
            Line((25.4, 1.524), (25.4, 1.27))
            ThreePointArc((25.4, 1.27), (26.298025612, 0.898025612), (26.67, 0))
            ThreePointArc((26.67, 0), (26.298025612, -0.898025612), (25.4, -1.27))
            Line((25.4, -1.27), (25.4, -1.524))
            Line((25.4, -1.524), (22.643661095, -1.524))
            ThreePointArc((22.643661095, -1.524), (23.8000016, -2.71292928), (25.4, -3.1496))
            ThreePointArc((25.4, -3.1496), (27.627103518, -2.227103518), (28.5496, 0))
        make_face()
    # profile 35 of 35: a face of its own
    with BuildSketch(Plane(origin=(0, 1.524, 0), x_dir=(1, 0, 0), z_dir=(0, 1, 0))):
        with BuildLine():
            Line((25.4, 1.524), (22.643661095, 1.524))
            ThreePointArc((22.643661095, 1.524), (22.2504, 0), (22.643661095, -1.524))
            Line((22.643661095, -1.524), (25.4, -1.524))
            Line((25.4, -1.524), (25.4, -1.27))
            ThreePointArc((25.4, -1.27), (24.13, 0), (25.4, 1.27))
            Line((25.4, 1.27), (25.4, 1.524))
        make_face()
    extrude(amount=BOSS_EXTRUDE2_DEPTH)

    # Sketch3 → Boss-Extrude3 (add)
    with BuildSketch(Plane(origin=(0, 8.128, 0), x_dir=(1, 0, 0), z_dir=(0, 1, 0))):
        with BuildLine():
            Line((-24.13, -8.89), (24.13, -8.89))
            ThreePointArc((24.13, -8.89), (33.02, 0), (24.13, 8.89))
            Line((24.13, 8.89), (-24.13, 8.89))
            ThreePointArc((-24.13, 8.89), (-33.02, 0), (-24.13, -8.89))
        make_face()
    extrude(amount=BOSS_EXTRUDE3_DEPTH)

    # Fillet1
    fillet1_edges = [part.edges().sort_by_distance(p)[0] for p in [
        (33.02, 0, 0),
        (0, 0, -8.89),
        (0, 0, 8.89),
        (-33.02, 0, 0),
        (33.02, 9.652, 0),
        (0, 9.652, 8.89),
        (0, 9.652, -8.89),
        (-33.02, 9.652, 0),
    ]]
    fillet(fillet1_edges, radius=FILLET1_R - 0.0001)  # a hair under: the kernel refuses the full size

    # Sketch2<3> → Cut-Extrude1 (cut, two sides: drawn at the far end of the back side and taken through both)
    with SkipClean():  # the faces are left unmerged after this step: merging them gives an invalid solid
        with BuildSketch(Plane(origin=(0, 1.524, 0), x_dir=(1, 0, 0), z_dir=(0, 1, 0)).offset(-CUT_EXTRUDE1_DEPTH_BACK)):
            with Locations(Location((-25.4, 0, 0), (0, 0, 90))):
                Circle(SKETCH2_3_R)
            with Locations(Location((-15.24, 0, 0), (0, 0, 90))):
                Circle(SKETCH2_3_R)
            with Locations(Location((-5.08, 0, 0), (0, 0, 90))):
                Circle(SKETCH2_3_R)
            with Locations(Location((5.08, 0, 0), (0, 0, 90))):
                Circle(SKETCH2_3_R)
            with Locations(Location((15.24, 0, 0), (0, 0, 90))):
                Circle(SKETCH2_3_R)
            with Locations(Location((25.4, 0, 0), (0, 0, 90))):
                Circle(SKETCH2_3_R)
        extrude(amount=CUT_EXTRUDE1_DEPTH + CUT_EXTRUDE1_DEPTH_BACK, mode=Mode.SUBTRACT)

    # Sketch4 → Cut-Extrude2 (cut, two sides: drawn at the far end of the back side and taken through both)
    with BuildSketch(Plane(origin=(0, 9.652, 0), x_dir=(1, 0, 0), z_dir=(0, 1, 0)).offset(-CUT_EXTRUDE2_DEPTH_BACK)):
        with Locations(Location((-25.4, 0, 0), (0, 0, 270))):
            Circle(SKETCH4_R)
        with Locations(Location((-15.24, 0, 0), (0, 0, 270))):
            Circle(SKETCH4_R)
        with Locations(Location((-5.08, 0, 0), (0, 0, 270))):
            Circle(SKETCH4_R)
        with Locations(Location((5.08, 0, 0), (0, 0, 270))):
            Circle(SKETCH4_R)
        with Locations(Location((15.24, 0, 0), (0, 0, 270))):
            Circle(SKETCH4_R)
        with Locations(Location((25.4, 0, 0), (0, 0, 270))):
            Circle(SKETCH4_R)
    extrude(amount=CUT_EXTRUDE2_DEPTH + CUT_EXTRUDE2_DEPTH_BACK, mode=Mode.SUBTRACT)


solid = part.part
